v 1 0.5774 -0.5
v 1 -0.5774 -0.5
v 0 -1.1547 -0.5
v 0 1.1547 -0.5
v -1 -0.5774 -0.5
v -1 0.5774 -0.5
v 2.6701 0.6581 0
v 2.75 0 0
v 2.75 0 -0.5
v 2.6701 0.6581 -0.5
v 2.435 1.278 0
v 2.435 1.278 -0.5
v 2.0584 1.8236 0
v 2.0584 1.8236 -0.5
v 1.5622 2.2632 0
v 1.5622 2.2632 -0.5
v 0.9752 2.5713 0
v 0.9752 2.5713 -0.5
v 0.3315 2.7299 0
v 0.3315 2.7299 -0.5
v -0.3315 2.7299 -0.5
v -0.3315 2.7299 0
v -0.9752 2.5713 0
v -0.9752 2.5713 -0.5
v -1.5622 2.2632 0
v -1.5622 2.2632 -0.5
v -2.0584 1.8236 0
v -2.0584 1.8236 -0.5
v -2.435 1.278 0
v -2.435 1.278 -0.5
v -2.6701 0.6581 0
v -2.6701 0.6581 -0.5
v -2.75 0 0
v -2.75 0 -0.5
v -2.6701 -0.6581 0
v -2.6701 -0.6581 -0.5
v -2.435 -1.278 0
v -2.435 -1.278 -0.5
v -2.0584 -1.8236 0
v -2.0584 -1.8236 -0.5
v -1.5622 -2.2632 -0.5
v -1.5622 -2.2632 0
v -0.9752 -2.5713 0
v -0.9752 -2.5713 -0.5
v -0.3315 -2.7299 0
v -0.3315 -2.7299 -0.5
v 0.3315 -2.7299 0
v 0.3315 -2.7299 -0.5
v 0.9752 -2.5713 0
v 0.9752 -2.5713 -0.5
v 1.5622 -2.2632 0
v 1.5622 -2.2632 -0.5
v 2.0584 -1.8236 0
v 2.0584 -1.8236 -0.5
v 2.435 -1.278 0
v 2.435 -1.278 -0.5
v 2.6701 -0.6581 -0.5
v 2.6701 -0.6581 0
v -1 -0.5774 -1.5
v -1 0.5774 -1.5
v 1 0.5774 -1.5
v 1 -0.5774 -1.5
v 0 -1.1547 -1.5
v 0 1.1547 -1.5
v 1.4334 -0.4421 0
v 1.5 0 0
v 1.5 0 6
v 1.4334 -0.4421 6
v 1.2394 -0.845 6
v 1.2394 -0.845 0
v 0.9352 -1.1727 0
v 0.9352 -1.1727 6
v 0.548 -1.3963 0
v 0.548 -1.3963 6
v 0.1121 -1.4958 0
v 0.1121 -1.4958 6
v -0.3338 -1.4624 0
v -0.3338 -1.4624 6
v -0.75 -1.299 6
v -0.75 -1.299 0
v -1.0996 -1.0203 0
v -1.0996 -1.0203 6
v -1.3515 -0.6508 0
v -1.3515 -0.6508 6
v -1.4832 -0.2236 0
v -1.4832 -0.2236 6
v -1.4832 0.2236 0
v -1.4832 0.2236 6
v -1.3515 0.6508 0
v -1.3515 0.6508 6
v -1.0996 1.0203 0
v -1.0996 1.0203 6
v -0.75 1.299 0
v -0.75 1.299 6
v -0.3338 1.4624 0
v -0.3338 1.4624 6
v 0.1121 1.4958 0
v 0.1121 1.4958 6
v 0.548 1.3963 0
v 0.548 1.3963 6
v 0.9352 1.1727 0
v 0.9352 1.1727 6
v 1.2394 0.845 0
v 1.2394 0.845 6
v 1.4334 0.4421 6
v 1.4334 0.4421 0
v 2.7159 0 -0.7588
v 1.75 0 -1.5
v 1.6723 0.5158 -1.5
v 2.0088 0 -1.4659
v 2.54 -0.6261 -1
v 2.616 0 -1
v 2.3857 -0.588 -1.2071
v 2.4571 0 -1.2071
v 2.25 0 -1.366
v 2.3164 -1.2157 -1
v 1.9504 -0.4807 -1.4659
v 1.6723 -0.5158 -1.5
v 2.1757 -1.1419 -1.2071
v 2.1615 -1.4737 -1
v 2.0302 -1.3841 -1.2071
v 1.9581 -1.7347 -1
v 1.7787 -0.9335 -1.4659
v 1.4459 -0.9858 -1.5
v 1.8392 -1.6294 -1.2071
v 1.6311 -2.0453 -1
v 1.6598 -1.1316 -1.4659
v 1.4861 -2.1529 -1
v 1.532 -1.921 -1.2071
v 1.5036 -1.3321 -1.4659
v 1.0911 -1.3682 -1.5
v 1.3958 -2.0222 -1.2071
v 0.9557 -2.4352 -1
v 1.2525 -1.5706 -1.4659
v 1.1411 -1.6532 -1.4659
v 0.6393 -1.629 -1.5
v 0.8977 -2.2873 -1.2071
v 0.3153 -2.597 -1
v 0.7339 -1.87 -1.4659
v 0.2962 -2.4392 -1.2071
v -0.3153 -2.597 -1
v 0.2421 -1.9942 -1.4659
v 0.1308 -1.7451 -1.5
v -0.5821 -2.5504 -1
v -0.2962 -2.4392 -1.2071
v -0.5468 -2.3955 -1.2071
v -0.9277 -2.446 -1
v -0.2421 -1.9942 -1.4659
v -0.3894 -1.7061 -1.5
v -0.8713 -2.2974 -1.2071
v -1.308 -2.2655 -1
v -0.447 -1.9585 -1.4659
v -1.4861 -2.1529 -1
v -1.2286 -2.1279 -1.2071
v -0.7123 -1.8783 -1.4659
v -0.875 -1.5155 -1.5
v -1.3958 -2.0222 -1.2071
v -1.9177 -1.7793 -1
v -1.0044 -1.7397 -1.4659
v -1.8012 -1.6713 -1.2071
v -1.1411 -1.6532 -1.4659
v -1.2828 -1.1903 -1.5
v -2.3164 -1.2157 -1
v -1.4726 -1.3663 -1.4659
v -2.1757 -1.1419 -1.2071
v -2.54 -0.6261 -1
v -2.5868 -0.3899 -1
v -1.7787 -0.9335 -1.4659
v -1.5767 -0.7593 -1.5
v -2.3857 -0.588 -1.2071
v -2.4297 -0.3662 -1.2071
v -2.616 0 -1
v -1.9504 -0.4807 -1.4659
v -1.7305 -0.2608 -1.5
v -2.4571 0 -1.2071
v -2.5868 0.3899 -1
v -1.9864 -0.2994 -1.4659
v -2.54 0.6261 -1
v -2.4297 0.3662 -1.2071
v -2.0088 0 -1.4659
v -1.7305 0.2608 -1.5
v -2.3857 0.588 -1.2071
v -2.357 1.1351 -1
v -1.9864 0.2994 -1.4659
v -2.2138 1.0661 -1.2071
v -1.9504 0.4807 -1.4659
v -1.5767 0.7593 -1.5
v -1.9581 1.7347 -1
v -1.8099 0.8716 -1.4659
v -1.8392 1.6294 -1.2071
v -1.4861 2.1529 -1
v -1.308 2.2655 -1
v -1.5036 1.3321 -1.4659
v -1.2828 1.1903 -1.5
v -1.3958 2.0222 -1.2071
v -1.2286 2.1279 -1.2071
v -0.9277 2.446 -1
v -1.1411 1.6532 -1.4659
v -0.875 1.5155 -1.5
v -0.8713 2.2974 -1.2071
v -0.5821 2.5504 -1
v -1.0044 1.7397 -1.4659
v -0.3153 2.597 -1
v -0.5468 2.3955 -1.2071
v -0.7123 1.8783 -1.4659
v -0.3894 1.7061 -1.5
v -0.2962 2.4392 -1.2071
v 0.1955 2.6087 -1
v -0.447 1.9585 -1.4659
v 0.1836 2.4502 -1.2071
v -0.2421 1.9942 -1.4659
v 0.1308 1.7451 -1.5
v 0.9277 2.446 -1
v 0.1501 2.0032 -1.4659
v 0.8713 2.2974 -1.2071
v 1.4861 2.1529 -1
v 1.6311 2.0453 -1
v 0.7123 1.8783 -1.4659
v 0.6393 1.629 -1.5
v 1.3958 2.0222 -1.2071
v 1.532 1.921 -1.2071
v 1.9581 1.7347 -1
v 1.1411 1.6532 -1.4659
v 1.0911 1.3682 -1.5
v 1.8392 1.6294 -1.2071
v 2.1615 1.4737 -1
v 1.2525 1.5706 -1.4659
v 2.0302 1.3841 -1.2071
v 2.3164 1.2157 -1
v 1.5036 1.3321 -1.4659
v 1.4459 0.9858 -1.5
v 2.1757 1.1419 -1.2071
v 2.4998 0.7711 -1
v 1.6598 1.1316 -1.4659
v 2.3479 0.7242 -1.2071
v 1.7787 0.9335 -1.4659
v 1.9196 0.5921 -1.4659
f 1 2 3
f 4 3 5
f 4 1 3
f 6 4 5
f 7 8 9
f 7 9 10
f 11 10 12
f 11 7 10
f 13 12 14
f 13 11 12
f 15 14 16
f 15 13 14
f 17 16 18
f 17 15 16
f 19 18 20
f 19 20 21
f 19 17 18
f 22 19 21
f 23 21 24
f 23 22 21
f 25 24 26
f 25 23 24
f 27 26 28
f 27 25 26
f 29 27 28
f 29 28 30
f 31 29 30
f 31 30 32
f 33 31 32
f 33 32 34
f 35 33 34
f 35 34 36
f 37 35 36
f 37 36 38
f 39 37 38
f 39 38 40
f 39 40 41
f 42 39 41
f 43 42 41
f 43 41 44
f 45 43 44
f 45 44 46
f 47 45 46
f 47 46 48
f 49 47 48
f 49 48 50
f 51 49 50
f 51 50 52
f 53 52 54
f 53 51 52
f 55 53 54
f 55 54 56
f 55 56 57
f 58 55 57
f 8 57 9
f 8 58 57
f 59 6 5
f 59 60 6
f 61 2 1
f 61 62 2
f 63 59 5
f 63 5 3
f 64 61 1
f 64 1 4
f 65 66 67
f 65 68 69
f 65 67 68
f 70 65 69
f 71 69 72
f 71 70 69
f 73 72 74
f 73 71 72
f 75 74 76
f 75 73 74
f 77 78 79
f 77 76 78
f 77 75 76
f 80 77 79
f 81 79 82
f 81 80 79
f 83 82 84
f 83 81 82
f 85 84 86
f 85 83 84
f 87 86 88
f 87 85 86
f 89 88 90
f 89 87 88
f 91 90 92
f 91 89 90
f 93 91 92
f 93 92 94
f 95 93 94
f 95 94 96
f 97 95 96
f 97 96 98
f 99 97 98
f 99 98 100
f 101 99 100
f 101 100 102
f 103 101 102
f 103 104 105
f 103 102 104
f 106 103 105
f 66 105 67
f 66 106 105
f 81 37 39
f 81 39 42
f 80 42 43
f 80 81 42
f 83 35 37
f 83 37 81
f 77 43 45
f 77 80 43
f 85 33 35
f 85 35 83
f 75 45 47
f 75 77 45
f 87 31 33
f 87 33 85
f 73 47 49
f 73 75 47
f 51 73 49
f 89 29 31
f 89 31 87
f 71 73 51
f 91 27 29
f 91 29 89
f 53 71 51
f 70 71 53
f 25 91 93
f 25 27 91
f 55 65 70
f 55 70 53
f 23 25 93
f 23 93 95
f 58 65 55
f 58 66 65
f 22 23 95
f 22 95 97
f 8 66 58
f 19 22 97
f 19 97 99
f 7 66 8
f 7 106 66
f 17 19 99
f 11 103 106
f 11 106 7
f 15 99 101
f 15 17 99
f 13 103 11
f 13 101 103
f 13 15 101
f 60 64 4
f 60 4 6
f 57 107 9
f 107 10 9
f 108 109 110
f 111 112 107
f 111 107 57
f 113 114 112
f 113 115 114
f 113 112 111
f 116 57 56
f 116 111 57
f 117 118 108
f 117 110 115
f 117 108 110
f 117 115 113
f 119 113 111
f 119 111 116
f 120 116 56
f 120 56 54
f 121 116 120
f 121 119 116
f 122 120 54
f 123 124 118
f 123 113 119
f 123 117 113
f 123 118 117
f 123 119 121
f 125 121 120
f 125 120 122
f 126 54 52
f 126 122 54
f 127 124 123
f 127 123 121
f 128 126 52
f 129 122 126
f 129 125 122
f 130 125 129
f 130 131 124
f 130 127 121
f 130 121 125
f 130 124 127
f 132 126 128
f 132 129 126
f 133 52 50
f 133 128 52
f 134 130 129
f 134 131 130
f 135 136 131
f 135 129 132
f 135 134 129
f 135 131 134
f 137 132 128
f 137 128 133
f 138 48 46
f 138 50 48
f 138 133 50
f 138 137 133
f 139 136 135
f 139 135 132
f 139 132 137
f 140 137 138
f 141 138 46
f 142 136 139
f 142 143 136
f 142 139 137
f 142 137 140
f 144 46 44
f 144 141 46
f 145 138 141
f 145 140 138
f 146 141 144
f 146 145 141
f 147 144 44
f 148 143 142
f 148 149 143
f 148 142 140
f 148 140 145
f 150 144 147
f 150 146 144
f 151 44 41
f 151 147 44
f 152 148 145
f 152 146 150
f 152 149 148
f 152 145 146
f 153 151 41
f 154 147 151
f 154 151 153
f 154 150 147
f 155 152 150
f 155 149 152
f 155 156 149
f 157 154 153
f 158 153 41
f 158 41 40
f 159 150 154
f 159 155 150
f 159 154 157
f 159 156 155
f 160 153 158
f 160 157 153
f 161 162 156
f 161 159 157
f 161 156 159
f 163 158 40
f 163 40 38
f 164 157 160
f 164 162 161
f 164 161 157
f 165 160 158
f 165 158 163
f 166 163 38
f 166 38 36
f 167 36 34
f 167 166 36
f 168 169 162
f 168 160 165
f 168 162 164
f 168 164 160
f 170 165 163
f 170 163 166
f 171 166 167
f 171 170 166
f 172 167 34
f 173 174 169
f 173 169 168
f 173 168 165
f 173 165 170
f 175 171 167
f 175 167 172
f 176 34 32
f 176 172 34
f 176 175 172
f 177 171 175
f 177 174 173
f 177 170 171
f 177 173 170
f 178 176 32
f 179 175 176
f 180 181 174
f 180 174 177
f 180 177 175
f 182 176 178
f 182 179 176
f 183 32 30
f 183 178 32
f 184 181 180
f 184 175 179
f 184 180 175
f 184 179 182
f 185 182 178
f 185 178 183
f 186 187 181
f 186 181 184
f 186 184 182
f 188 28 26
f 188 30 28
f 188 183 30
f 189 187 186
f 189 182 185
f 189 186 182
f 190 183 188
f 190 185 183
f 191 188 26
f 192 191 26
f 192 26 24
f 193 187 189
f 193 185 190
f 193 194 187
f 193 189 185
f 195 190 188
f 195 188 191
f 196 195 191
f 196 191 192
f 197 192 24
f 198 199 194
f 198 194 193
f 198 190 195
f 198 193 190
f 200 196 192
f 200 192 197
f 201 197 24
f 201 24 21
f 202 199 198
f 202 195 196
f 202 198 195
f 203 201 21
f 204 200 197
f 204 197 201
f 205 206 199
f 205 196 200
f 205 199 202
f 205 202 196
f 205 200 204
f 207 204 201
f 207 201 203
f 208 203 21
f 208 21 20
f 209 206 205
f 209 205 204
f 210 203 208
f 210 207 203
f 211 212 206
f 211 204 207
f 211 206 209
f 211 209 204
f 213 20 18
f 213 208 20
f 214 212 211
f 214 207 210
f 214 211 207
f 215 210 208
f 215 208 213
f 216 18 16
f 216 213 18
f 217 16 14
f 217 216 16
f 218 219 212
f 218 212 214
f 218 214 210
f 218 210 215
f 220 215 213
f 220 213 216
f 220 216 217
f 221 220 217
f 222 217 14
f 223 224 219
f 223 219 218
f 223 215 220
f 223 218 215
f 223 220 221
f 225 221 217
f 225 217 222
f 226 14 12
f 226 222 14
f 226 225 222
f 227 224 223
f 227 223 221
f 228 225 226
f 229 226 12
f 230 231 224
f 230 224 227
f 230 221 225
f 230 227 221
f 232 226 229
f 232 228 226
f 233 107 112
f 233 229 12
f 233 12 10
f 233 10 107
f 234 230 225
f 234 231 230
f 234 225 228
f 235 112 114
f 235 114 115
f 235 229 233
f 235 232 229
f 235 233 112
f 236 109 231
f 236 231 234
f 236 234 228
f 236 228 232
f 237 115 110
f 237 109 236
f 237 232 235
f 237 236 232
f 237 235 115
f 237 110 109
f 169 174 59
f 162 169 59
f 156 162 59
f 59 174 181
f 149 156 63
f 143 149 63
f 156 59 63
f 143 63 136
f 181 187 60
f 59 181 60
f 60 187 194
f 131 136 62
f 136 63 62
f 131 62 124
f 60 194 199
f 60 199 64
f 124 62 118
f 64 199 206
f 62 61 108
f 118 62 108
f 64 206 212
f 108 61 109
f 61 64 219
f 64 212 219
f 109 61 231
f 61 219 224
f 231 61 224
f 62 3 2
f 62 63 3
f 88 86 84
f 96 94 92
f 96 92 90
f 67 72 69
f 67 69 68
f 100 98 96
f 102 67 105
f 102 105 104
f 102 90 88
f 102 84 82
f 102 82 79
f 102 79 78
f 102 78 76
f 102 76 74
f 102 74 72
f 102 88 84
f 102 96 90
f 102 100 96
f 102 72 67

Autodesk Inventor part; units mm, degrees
ref_plane "YZ Plane" through (0, 0, 0) normal (1, 0, 0) x (0, 1, 0)
ref_plane "XZ Plane" through (0, 0, 0) normal (0, 1, 0) x (-1, 0, 0)
ref_plane "XY Plane" through (0, 0, 0) normal (0, 0, 1) x (1, 0, 0)
sketch "Эскиз1" plane through (0, 0, 0) normal (0, 0, 1) x (1, 0, 0)
  circle A0 centre (0, 0) radius 1.5
  circle A1 centre (0, 0) radius 2.75
  dimension "d0" = 5.5
  dimension "d1" = 3
extrude "Выдавливание1" add sketch "Эскиз1" along normal blind 6 contours A0
extrude "Выдавливание2" add sketch "Эскиз1" against normal blind 1.5 contours A0 | A1
thread "Резьба1" size "M3x0.5" class "6g" standard "ISO Metric profile" full length
sketch "Эскиз2" plane through (0, 0, -1.5) normal (0, 0, -1) x (-1, 0, 0)
  line L0 (0, 1.1547) -> (1, 0.5774)
  line L1 (1, 0.5774) -> (1, -0.5774)
  line L2 (1, -0.5774) -> (0, -1.1547)
  line L3 (0, -1.1547) -> (-1, -0.5774)
  line L4 (-1, -0.5774) -> (-1, 0.5774)
  line L5 (-1, 0.5774) -> (0, 1.1547)
  point P0 (0, 0)
  point P1 (0, 0)
  dimension "d8" = 2
extrude "Выдавливание3" cut sketch "Эскиз2" against normal blind 1
fillet "Сопряжение1" radius 1 1 edges at (-2.75, 0, -1.5)
properties part number "Болт М3 6 мм"
